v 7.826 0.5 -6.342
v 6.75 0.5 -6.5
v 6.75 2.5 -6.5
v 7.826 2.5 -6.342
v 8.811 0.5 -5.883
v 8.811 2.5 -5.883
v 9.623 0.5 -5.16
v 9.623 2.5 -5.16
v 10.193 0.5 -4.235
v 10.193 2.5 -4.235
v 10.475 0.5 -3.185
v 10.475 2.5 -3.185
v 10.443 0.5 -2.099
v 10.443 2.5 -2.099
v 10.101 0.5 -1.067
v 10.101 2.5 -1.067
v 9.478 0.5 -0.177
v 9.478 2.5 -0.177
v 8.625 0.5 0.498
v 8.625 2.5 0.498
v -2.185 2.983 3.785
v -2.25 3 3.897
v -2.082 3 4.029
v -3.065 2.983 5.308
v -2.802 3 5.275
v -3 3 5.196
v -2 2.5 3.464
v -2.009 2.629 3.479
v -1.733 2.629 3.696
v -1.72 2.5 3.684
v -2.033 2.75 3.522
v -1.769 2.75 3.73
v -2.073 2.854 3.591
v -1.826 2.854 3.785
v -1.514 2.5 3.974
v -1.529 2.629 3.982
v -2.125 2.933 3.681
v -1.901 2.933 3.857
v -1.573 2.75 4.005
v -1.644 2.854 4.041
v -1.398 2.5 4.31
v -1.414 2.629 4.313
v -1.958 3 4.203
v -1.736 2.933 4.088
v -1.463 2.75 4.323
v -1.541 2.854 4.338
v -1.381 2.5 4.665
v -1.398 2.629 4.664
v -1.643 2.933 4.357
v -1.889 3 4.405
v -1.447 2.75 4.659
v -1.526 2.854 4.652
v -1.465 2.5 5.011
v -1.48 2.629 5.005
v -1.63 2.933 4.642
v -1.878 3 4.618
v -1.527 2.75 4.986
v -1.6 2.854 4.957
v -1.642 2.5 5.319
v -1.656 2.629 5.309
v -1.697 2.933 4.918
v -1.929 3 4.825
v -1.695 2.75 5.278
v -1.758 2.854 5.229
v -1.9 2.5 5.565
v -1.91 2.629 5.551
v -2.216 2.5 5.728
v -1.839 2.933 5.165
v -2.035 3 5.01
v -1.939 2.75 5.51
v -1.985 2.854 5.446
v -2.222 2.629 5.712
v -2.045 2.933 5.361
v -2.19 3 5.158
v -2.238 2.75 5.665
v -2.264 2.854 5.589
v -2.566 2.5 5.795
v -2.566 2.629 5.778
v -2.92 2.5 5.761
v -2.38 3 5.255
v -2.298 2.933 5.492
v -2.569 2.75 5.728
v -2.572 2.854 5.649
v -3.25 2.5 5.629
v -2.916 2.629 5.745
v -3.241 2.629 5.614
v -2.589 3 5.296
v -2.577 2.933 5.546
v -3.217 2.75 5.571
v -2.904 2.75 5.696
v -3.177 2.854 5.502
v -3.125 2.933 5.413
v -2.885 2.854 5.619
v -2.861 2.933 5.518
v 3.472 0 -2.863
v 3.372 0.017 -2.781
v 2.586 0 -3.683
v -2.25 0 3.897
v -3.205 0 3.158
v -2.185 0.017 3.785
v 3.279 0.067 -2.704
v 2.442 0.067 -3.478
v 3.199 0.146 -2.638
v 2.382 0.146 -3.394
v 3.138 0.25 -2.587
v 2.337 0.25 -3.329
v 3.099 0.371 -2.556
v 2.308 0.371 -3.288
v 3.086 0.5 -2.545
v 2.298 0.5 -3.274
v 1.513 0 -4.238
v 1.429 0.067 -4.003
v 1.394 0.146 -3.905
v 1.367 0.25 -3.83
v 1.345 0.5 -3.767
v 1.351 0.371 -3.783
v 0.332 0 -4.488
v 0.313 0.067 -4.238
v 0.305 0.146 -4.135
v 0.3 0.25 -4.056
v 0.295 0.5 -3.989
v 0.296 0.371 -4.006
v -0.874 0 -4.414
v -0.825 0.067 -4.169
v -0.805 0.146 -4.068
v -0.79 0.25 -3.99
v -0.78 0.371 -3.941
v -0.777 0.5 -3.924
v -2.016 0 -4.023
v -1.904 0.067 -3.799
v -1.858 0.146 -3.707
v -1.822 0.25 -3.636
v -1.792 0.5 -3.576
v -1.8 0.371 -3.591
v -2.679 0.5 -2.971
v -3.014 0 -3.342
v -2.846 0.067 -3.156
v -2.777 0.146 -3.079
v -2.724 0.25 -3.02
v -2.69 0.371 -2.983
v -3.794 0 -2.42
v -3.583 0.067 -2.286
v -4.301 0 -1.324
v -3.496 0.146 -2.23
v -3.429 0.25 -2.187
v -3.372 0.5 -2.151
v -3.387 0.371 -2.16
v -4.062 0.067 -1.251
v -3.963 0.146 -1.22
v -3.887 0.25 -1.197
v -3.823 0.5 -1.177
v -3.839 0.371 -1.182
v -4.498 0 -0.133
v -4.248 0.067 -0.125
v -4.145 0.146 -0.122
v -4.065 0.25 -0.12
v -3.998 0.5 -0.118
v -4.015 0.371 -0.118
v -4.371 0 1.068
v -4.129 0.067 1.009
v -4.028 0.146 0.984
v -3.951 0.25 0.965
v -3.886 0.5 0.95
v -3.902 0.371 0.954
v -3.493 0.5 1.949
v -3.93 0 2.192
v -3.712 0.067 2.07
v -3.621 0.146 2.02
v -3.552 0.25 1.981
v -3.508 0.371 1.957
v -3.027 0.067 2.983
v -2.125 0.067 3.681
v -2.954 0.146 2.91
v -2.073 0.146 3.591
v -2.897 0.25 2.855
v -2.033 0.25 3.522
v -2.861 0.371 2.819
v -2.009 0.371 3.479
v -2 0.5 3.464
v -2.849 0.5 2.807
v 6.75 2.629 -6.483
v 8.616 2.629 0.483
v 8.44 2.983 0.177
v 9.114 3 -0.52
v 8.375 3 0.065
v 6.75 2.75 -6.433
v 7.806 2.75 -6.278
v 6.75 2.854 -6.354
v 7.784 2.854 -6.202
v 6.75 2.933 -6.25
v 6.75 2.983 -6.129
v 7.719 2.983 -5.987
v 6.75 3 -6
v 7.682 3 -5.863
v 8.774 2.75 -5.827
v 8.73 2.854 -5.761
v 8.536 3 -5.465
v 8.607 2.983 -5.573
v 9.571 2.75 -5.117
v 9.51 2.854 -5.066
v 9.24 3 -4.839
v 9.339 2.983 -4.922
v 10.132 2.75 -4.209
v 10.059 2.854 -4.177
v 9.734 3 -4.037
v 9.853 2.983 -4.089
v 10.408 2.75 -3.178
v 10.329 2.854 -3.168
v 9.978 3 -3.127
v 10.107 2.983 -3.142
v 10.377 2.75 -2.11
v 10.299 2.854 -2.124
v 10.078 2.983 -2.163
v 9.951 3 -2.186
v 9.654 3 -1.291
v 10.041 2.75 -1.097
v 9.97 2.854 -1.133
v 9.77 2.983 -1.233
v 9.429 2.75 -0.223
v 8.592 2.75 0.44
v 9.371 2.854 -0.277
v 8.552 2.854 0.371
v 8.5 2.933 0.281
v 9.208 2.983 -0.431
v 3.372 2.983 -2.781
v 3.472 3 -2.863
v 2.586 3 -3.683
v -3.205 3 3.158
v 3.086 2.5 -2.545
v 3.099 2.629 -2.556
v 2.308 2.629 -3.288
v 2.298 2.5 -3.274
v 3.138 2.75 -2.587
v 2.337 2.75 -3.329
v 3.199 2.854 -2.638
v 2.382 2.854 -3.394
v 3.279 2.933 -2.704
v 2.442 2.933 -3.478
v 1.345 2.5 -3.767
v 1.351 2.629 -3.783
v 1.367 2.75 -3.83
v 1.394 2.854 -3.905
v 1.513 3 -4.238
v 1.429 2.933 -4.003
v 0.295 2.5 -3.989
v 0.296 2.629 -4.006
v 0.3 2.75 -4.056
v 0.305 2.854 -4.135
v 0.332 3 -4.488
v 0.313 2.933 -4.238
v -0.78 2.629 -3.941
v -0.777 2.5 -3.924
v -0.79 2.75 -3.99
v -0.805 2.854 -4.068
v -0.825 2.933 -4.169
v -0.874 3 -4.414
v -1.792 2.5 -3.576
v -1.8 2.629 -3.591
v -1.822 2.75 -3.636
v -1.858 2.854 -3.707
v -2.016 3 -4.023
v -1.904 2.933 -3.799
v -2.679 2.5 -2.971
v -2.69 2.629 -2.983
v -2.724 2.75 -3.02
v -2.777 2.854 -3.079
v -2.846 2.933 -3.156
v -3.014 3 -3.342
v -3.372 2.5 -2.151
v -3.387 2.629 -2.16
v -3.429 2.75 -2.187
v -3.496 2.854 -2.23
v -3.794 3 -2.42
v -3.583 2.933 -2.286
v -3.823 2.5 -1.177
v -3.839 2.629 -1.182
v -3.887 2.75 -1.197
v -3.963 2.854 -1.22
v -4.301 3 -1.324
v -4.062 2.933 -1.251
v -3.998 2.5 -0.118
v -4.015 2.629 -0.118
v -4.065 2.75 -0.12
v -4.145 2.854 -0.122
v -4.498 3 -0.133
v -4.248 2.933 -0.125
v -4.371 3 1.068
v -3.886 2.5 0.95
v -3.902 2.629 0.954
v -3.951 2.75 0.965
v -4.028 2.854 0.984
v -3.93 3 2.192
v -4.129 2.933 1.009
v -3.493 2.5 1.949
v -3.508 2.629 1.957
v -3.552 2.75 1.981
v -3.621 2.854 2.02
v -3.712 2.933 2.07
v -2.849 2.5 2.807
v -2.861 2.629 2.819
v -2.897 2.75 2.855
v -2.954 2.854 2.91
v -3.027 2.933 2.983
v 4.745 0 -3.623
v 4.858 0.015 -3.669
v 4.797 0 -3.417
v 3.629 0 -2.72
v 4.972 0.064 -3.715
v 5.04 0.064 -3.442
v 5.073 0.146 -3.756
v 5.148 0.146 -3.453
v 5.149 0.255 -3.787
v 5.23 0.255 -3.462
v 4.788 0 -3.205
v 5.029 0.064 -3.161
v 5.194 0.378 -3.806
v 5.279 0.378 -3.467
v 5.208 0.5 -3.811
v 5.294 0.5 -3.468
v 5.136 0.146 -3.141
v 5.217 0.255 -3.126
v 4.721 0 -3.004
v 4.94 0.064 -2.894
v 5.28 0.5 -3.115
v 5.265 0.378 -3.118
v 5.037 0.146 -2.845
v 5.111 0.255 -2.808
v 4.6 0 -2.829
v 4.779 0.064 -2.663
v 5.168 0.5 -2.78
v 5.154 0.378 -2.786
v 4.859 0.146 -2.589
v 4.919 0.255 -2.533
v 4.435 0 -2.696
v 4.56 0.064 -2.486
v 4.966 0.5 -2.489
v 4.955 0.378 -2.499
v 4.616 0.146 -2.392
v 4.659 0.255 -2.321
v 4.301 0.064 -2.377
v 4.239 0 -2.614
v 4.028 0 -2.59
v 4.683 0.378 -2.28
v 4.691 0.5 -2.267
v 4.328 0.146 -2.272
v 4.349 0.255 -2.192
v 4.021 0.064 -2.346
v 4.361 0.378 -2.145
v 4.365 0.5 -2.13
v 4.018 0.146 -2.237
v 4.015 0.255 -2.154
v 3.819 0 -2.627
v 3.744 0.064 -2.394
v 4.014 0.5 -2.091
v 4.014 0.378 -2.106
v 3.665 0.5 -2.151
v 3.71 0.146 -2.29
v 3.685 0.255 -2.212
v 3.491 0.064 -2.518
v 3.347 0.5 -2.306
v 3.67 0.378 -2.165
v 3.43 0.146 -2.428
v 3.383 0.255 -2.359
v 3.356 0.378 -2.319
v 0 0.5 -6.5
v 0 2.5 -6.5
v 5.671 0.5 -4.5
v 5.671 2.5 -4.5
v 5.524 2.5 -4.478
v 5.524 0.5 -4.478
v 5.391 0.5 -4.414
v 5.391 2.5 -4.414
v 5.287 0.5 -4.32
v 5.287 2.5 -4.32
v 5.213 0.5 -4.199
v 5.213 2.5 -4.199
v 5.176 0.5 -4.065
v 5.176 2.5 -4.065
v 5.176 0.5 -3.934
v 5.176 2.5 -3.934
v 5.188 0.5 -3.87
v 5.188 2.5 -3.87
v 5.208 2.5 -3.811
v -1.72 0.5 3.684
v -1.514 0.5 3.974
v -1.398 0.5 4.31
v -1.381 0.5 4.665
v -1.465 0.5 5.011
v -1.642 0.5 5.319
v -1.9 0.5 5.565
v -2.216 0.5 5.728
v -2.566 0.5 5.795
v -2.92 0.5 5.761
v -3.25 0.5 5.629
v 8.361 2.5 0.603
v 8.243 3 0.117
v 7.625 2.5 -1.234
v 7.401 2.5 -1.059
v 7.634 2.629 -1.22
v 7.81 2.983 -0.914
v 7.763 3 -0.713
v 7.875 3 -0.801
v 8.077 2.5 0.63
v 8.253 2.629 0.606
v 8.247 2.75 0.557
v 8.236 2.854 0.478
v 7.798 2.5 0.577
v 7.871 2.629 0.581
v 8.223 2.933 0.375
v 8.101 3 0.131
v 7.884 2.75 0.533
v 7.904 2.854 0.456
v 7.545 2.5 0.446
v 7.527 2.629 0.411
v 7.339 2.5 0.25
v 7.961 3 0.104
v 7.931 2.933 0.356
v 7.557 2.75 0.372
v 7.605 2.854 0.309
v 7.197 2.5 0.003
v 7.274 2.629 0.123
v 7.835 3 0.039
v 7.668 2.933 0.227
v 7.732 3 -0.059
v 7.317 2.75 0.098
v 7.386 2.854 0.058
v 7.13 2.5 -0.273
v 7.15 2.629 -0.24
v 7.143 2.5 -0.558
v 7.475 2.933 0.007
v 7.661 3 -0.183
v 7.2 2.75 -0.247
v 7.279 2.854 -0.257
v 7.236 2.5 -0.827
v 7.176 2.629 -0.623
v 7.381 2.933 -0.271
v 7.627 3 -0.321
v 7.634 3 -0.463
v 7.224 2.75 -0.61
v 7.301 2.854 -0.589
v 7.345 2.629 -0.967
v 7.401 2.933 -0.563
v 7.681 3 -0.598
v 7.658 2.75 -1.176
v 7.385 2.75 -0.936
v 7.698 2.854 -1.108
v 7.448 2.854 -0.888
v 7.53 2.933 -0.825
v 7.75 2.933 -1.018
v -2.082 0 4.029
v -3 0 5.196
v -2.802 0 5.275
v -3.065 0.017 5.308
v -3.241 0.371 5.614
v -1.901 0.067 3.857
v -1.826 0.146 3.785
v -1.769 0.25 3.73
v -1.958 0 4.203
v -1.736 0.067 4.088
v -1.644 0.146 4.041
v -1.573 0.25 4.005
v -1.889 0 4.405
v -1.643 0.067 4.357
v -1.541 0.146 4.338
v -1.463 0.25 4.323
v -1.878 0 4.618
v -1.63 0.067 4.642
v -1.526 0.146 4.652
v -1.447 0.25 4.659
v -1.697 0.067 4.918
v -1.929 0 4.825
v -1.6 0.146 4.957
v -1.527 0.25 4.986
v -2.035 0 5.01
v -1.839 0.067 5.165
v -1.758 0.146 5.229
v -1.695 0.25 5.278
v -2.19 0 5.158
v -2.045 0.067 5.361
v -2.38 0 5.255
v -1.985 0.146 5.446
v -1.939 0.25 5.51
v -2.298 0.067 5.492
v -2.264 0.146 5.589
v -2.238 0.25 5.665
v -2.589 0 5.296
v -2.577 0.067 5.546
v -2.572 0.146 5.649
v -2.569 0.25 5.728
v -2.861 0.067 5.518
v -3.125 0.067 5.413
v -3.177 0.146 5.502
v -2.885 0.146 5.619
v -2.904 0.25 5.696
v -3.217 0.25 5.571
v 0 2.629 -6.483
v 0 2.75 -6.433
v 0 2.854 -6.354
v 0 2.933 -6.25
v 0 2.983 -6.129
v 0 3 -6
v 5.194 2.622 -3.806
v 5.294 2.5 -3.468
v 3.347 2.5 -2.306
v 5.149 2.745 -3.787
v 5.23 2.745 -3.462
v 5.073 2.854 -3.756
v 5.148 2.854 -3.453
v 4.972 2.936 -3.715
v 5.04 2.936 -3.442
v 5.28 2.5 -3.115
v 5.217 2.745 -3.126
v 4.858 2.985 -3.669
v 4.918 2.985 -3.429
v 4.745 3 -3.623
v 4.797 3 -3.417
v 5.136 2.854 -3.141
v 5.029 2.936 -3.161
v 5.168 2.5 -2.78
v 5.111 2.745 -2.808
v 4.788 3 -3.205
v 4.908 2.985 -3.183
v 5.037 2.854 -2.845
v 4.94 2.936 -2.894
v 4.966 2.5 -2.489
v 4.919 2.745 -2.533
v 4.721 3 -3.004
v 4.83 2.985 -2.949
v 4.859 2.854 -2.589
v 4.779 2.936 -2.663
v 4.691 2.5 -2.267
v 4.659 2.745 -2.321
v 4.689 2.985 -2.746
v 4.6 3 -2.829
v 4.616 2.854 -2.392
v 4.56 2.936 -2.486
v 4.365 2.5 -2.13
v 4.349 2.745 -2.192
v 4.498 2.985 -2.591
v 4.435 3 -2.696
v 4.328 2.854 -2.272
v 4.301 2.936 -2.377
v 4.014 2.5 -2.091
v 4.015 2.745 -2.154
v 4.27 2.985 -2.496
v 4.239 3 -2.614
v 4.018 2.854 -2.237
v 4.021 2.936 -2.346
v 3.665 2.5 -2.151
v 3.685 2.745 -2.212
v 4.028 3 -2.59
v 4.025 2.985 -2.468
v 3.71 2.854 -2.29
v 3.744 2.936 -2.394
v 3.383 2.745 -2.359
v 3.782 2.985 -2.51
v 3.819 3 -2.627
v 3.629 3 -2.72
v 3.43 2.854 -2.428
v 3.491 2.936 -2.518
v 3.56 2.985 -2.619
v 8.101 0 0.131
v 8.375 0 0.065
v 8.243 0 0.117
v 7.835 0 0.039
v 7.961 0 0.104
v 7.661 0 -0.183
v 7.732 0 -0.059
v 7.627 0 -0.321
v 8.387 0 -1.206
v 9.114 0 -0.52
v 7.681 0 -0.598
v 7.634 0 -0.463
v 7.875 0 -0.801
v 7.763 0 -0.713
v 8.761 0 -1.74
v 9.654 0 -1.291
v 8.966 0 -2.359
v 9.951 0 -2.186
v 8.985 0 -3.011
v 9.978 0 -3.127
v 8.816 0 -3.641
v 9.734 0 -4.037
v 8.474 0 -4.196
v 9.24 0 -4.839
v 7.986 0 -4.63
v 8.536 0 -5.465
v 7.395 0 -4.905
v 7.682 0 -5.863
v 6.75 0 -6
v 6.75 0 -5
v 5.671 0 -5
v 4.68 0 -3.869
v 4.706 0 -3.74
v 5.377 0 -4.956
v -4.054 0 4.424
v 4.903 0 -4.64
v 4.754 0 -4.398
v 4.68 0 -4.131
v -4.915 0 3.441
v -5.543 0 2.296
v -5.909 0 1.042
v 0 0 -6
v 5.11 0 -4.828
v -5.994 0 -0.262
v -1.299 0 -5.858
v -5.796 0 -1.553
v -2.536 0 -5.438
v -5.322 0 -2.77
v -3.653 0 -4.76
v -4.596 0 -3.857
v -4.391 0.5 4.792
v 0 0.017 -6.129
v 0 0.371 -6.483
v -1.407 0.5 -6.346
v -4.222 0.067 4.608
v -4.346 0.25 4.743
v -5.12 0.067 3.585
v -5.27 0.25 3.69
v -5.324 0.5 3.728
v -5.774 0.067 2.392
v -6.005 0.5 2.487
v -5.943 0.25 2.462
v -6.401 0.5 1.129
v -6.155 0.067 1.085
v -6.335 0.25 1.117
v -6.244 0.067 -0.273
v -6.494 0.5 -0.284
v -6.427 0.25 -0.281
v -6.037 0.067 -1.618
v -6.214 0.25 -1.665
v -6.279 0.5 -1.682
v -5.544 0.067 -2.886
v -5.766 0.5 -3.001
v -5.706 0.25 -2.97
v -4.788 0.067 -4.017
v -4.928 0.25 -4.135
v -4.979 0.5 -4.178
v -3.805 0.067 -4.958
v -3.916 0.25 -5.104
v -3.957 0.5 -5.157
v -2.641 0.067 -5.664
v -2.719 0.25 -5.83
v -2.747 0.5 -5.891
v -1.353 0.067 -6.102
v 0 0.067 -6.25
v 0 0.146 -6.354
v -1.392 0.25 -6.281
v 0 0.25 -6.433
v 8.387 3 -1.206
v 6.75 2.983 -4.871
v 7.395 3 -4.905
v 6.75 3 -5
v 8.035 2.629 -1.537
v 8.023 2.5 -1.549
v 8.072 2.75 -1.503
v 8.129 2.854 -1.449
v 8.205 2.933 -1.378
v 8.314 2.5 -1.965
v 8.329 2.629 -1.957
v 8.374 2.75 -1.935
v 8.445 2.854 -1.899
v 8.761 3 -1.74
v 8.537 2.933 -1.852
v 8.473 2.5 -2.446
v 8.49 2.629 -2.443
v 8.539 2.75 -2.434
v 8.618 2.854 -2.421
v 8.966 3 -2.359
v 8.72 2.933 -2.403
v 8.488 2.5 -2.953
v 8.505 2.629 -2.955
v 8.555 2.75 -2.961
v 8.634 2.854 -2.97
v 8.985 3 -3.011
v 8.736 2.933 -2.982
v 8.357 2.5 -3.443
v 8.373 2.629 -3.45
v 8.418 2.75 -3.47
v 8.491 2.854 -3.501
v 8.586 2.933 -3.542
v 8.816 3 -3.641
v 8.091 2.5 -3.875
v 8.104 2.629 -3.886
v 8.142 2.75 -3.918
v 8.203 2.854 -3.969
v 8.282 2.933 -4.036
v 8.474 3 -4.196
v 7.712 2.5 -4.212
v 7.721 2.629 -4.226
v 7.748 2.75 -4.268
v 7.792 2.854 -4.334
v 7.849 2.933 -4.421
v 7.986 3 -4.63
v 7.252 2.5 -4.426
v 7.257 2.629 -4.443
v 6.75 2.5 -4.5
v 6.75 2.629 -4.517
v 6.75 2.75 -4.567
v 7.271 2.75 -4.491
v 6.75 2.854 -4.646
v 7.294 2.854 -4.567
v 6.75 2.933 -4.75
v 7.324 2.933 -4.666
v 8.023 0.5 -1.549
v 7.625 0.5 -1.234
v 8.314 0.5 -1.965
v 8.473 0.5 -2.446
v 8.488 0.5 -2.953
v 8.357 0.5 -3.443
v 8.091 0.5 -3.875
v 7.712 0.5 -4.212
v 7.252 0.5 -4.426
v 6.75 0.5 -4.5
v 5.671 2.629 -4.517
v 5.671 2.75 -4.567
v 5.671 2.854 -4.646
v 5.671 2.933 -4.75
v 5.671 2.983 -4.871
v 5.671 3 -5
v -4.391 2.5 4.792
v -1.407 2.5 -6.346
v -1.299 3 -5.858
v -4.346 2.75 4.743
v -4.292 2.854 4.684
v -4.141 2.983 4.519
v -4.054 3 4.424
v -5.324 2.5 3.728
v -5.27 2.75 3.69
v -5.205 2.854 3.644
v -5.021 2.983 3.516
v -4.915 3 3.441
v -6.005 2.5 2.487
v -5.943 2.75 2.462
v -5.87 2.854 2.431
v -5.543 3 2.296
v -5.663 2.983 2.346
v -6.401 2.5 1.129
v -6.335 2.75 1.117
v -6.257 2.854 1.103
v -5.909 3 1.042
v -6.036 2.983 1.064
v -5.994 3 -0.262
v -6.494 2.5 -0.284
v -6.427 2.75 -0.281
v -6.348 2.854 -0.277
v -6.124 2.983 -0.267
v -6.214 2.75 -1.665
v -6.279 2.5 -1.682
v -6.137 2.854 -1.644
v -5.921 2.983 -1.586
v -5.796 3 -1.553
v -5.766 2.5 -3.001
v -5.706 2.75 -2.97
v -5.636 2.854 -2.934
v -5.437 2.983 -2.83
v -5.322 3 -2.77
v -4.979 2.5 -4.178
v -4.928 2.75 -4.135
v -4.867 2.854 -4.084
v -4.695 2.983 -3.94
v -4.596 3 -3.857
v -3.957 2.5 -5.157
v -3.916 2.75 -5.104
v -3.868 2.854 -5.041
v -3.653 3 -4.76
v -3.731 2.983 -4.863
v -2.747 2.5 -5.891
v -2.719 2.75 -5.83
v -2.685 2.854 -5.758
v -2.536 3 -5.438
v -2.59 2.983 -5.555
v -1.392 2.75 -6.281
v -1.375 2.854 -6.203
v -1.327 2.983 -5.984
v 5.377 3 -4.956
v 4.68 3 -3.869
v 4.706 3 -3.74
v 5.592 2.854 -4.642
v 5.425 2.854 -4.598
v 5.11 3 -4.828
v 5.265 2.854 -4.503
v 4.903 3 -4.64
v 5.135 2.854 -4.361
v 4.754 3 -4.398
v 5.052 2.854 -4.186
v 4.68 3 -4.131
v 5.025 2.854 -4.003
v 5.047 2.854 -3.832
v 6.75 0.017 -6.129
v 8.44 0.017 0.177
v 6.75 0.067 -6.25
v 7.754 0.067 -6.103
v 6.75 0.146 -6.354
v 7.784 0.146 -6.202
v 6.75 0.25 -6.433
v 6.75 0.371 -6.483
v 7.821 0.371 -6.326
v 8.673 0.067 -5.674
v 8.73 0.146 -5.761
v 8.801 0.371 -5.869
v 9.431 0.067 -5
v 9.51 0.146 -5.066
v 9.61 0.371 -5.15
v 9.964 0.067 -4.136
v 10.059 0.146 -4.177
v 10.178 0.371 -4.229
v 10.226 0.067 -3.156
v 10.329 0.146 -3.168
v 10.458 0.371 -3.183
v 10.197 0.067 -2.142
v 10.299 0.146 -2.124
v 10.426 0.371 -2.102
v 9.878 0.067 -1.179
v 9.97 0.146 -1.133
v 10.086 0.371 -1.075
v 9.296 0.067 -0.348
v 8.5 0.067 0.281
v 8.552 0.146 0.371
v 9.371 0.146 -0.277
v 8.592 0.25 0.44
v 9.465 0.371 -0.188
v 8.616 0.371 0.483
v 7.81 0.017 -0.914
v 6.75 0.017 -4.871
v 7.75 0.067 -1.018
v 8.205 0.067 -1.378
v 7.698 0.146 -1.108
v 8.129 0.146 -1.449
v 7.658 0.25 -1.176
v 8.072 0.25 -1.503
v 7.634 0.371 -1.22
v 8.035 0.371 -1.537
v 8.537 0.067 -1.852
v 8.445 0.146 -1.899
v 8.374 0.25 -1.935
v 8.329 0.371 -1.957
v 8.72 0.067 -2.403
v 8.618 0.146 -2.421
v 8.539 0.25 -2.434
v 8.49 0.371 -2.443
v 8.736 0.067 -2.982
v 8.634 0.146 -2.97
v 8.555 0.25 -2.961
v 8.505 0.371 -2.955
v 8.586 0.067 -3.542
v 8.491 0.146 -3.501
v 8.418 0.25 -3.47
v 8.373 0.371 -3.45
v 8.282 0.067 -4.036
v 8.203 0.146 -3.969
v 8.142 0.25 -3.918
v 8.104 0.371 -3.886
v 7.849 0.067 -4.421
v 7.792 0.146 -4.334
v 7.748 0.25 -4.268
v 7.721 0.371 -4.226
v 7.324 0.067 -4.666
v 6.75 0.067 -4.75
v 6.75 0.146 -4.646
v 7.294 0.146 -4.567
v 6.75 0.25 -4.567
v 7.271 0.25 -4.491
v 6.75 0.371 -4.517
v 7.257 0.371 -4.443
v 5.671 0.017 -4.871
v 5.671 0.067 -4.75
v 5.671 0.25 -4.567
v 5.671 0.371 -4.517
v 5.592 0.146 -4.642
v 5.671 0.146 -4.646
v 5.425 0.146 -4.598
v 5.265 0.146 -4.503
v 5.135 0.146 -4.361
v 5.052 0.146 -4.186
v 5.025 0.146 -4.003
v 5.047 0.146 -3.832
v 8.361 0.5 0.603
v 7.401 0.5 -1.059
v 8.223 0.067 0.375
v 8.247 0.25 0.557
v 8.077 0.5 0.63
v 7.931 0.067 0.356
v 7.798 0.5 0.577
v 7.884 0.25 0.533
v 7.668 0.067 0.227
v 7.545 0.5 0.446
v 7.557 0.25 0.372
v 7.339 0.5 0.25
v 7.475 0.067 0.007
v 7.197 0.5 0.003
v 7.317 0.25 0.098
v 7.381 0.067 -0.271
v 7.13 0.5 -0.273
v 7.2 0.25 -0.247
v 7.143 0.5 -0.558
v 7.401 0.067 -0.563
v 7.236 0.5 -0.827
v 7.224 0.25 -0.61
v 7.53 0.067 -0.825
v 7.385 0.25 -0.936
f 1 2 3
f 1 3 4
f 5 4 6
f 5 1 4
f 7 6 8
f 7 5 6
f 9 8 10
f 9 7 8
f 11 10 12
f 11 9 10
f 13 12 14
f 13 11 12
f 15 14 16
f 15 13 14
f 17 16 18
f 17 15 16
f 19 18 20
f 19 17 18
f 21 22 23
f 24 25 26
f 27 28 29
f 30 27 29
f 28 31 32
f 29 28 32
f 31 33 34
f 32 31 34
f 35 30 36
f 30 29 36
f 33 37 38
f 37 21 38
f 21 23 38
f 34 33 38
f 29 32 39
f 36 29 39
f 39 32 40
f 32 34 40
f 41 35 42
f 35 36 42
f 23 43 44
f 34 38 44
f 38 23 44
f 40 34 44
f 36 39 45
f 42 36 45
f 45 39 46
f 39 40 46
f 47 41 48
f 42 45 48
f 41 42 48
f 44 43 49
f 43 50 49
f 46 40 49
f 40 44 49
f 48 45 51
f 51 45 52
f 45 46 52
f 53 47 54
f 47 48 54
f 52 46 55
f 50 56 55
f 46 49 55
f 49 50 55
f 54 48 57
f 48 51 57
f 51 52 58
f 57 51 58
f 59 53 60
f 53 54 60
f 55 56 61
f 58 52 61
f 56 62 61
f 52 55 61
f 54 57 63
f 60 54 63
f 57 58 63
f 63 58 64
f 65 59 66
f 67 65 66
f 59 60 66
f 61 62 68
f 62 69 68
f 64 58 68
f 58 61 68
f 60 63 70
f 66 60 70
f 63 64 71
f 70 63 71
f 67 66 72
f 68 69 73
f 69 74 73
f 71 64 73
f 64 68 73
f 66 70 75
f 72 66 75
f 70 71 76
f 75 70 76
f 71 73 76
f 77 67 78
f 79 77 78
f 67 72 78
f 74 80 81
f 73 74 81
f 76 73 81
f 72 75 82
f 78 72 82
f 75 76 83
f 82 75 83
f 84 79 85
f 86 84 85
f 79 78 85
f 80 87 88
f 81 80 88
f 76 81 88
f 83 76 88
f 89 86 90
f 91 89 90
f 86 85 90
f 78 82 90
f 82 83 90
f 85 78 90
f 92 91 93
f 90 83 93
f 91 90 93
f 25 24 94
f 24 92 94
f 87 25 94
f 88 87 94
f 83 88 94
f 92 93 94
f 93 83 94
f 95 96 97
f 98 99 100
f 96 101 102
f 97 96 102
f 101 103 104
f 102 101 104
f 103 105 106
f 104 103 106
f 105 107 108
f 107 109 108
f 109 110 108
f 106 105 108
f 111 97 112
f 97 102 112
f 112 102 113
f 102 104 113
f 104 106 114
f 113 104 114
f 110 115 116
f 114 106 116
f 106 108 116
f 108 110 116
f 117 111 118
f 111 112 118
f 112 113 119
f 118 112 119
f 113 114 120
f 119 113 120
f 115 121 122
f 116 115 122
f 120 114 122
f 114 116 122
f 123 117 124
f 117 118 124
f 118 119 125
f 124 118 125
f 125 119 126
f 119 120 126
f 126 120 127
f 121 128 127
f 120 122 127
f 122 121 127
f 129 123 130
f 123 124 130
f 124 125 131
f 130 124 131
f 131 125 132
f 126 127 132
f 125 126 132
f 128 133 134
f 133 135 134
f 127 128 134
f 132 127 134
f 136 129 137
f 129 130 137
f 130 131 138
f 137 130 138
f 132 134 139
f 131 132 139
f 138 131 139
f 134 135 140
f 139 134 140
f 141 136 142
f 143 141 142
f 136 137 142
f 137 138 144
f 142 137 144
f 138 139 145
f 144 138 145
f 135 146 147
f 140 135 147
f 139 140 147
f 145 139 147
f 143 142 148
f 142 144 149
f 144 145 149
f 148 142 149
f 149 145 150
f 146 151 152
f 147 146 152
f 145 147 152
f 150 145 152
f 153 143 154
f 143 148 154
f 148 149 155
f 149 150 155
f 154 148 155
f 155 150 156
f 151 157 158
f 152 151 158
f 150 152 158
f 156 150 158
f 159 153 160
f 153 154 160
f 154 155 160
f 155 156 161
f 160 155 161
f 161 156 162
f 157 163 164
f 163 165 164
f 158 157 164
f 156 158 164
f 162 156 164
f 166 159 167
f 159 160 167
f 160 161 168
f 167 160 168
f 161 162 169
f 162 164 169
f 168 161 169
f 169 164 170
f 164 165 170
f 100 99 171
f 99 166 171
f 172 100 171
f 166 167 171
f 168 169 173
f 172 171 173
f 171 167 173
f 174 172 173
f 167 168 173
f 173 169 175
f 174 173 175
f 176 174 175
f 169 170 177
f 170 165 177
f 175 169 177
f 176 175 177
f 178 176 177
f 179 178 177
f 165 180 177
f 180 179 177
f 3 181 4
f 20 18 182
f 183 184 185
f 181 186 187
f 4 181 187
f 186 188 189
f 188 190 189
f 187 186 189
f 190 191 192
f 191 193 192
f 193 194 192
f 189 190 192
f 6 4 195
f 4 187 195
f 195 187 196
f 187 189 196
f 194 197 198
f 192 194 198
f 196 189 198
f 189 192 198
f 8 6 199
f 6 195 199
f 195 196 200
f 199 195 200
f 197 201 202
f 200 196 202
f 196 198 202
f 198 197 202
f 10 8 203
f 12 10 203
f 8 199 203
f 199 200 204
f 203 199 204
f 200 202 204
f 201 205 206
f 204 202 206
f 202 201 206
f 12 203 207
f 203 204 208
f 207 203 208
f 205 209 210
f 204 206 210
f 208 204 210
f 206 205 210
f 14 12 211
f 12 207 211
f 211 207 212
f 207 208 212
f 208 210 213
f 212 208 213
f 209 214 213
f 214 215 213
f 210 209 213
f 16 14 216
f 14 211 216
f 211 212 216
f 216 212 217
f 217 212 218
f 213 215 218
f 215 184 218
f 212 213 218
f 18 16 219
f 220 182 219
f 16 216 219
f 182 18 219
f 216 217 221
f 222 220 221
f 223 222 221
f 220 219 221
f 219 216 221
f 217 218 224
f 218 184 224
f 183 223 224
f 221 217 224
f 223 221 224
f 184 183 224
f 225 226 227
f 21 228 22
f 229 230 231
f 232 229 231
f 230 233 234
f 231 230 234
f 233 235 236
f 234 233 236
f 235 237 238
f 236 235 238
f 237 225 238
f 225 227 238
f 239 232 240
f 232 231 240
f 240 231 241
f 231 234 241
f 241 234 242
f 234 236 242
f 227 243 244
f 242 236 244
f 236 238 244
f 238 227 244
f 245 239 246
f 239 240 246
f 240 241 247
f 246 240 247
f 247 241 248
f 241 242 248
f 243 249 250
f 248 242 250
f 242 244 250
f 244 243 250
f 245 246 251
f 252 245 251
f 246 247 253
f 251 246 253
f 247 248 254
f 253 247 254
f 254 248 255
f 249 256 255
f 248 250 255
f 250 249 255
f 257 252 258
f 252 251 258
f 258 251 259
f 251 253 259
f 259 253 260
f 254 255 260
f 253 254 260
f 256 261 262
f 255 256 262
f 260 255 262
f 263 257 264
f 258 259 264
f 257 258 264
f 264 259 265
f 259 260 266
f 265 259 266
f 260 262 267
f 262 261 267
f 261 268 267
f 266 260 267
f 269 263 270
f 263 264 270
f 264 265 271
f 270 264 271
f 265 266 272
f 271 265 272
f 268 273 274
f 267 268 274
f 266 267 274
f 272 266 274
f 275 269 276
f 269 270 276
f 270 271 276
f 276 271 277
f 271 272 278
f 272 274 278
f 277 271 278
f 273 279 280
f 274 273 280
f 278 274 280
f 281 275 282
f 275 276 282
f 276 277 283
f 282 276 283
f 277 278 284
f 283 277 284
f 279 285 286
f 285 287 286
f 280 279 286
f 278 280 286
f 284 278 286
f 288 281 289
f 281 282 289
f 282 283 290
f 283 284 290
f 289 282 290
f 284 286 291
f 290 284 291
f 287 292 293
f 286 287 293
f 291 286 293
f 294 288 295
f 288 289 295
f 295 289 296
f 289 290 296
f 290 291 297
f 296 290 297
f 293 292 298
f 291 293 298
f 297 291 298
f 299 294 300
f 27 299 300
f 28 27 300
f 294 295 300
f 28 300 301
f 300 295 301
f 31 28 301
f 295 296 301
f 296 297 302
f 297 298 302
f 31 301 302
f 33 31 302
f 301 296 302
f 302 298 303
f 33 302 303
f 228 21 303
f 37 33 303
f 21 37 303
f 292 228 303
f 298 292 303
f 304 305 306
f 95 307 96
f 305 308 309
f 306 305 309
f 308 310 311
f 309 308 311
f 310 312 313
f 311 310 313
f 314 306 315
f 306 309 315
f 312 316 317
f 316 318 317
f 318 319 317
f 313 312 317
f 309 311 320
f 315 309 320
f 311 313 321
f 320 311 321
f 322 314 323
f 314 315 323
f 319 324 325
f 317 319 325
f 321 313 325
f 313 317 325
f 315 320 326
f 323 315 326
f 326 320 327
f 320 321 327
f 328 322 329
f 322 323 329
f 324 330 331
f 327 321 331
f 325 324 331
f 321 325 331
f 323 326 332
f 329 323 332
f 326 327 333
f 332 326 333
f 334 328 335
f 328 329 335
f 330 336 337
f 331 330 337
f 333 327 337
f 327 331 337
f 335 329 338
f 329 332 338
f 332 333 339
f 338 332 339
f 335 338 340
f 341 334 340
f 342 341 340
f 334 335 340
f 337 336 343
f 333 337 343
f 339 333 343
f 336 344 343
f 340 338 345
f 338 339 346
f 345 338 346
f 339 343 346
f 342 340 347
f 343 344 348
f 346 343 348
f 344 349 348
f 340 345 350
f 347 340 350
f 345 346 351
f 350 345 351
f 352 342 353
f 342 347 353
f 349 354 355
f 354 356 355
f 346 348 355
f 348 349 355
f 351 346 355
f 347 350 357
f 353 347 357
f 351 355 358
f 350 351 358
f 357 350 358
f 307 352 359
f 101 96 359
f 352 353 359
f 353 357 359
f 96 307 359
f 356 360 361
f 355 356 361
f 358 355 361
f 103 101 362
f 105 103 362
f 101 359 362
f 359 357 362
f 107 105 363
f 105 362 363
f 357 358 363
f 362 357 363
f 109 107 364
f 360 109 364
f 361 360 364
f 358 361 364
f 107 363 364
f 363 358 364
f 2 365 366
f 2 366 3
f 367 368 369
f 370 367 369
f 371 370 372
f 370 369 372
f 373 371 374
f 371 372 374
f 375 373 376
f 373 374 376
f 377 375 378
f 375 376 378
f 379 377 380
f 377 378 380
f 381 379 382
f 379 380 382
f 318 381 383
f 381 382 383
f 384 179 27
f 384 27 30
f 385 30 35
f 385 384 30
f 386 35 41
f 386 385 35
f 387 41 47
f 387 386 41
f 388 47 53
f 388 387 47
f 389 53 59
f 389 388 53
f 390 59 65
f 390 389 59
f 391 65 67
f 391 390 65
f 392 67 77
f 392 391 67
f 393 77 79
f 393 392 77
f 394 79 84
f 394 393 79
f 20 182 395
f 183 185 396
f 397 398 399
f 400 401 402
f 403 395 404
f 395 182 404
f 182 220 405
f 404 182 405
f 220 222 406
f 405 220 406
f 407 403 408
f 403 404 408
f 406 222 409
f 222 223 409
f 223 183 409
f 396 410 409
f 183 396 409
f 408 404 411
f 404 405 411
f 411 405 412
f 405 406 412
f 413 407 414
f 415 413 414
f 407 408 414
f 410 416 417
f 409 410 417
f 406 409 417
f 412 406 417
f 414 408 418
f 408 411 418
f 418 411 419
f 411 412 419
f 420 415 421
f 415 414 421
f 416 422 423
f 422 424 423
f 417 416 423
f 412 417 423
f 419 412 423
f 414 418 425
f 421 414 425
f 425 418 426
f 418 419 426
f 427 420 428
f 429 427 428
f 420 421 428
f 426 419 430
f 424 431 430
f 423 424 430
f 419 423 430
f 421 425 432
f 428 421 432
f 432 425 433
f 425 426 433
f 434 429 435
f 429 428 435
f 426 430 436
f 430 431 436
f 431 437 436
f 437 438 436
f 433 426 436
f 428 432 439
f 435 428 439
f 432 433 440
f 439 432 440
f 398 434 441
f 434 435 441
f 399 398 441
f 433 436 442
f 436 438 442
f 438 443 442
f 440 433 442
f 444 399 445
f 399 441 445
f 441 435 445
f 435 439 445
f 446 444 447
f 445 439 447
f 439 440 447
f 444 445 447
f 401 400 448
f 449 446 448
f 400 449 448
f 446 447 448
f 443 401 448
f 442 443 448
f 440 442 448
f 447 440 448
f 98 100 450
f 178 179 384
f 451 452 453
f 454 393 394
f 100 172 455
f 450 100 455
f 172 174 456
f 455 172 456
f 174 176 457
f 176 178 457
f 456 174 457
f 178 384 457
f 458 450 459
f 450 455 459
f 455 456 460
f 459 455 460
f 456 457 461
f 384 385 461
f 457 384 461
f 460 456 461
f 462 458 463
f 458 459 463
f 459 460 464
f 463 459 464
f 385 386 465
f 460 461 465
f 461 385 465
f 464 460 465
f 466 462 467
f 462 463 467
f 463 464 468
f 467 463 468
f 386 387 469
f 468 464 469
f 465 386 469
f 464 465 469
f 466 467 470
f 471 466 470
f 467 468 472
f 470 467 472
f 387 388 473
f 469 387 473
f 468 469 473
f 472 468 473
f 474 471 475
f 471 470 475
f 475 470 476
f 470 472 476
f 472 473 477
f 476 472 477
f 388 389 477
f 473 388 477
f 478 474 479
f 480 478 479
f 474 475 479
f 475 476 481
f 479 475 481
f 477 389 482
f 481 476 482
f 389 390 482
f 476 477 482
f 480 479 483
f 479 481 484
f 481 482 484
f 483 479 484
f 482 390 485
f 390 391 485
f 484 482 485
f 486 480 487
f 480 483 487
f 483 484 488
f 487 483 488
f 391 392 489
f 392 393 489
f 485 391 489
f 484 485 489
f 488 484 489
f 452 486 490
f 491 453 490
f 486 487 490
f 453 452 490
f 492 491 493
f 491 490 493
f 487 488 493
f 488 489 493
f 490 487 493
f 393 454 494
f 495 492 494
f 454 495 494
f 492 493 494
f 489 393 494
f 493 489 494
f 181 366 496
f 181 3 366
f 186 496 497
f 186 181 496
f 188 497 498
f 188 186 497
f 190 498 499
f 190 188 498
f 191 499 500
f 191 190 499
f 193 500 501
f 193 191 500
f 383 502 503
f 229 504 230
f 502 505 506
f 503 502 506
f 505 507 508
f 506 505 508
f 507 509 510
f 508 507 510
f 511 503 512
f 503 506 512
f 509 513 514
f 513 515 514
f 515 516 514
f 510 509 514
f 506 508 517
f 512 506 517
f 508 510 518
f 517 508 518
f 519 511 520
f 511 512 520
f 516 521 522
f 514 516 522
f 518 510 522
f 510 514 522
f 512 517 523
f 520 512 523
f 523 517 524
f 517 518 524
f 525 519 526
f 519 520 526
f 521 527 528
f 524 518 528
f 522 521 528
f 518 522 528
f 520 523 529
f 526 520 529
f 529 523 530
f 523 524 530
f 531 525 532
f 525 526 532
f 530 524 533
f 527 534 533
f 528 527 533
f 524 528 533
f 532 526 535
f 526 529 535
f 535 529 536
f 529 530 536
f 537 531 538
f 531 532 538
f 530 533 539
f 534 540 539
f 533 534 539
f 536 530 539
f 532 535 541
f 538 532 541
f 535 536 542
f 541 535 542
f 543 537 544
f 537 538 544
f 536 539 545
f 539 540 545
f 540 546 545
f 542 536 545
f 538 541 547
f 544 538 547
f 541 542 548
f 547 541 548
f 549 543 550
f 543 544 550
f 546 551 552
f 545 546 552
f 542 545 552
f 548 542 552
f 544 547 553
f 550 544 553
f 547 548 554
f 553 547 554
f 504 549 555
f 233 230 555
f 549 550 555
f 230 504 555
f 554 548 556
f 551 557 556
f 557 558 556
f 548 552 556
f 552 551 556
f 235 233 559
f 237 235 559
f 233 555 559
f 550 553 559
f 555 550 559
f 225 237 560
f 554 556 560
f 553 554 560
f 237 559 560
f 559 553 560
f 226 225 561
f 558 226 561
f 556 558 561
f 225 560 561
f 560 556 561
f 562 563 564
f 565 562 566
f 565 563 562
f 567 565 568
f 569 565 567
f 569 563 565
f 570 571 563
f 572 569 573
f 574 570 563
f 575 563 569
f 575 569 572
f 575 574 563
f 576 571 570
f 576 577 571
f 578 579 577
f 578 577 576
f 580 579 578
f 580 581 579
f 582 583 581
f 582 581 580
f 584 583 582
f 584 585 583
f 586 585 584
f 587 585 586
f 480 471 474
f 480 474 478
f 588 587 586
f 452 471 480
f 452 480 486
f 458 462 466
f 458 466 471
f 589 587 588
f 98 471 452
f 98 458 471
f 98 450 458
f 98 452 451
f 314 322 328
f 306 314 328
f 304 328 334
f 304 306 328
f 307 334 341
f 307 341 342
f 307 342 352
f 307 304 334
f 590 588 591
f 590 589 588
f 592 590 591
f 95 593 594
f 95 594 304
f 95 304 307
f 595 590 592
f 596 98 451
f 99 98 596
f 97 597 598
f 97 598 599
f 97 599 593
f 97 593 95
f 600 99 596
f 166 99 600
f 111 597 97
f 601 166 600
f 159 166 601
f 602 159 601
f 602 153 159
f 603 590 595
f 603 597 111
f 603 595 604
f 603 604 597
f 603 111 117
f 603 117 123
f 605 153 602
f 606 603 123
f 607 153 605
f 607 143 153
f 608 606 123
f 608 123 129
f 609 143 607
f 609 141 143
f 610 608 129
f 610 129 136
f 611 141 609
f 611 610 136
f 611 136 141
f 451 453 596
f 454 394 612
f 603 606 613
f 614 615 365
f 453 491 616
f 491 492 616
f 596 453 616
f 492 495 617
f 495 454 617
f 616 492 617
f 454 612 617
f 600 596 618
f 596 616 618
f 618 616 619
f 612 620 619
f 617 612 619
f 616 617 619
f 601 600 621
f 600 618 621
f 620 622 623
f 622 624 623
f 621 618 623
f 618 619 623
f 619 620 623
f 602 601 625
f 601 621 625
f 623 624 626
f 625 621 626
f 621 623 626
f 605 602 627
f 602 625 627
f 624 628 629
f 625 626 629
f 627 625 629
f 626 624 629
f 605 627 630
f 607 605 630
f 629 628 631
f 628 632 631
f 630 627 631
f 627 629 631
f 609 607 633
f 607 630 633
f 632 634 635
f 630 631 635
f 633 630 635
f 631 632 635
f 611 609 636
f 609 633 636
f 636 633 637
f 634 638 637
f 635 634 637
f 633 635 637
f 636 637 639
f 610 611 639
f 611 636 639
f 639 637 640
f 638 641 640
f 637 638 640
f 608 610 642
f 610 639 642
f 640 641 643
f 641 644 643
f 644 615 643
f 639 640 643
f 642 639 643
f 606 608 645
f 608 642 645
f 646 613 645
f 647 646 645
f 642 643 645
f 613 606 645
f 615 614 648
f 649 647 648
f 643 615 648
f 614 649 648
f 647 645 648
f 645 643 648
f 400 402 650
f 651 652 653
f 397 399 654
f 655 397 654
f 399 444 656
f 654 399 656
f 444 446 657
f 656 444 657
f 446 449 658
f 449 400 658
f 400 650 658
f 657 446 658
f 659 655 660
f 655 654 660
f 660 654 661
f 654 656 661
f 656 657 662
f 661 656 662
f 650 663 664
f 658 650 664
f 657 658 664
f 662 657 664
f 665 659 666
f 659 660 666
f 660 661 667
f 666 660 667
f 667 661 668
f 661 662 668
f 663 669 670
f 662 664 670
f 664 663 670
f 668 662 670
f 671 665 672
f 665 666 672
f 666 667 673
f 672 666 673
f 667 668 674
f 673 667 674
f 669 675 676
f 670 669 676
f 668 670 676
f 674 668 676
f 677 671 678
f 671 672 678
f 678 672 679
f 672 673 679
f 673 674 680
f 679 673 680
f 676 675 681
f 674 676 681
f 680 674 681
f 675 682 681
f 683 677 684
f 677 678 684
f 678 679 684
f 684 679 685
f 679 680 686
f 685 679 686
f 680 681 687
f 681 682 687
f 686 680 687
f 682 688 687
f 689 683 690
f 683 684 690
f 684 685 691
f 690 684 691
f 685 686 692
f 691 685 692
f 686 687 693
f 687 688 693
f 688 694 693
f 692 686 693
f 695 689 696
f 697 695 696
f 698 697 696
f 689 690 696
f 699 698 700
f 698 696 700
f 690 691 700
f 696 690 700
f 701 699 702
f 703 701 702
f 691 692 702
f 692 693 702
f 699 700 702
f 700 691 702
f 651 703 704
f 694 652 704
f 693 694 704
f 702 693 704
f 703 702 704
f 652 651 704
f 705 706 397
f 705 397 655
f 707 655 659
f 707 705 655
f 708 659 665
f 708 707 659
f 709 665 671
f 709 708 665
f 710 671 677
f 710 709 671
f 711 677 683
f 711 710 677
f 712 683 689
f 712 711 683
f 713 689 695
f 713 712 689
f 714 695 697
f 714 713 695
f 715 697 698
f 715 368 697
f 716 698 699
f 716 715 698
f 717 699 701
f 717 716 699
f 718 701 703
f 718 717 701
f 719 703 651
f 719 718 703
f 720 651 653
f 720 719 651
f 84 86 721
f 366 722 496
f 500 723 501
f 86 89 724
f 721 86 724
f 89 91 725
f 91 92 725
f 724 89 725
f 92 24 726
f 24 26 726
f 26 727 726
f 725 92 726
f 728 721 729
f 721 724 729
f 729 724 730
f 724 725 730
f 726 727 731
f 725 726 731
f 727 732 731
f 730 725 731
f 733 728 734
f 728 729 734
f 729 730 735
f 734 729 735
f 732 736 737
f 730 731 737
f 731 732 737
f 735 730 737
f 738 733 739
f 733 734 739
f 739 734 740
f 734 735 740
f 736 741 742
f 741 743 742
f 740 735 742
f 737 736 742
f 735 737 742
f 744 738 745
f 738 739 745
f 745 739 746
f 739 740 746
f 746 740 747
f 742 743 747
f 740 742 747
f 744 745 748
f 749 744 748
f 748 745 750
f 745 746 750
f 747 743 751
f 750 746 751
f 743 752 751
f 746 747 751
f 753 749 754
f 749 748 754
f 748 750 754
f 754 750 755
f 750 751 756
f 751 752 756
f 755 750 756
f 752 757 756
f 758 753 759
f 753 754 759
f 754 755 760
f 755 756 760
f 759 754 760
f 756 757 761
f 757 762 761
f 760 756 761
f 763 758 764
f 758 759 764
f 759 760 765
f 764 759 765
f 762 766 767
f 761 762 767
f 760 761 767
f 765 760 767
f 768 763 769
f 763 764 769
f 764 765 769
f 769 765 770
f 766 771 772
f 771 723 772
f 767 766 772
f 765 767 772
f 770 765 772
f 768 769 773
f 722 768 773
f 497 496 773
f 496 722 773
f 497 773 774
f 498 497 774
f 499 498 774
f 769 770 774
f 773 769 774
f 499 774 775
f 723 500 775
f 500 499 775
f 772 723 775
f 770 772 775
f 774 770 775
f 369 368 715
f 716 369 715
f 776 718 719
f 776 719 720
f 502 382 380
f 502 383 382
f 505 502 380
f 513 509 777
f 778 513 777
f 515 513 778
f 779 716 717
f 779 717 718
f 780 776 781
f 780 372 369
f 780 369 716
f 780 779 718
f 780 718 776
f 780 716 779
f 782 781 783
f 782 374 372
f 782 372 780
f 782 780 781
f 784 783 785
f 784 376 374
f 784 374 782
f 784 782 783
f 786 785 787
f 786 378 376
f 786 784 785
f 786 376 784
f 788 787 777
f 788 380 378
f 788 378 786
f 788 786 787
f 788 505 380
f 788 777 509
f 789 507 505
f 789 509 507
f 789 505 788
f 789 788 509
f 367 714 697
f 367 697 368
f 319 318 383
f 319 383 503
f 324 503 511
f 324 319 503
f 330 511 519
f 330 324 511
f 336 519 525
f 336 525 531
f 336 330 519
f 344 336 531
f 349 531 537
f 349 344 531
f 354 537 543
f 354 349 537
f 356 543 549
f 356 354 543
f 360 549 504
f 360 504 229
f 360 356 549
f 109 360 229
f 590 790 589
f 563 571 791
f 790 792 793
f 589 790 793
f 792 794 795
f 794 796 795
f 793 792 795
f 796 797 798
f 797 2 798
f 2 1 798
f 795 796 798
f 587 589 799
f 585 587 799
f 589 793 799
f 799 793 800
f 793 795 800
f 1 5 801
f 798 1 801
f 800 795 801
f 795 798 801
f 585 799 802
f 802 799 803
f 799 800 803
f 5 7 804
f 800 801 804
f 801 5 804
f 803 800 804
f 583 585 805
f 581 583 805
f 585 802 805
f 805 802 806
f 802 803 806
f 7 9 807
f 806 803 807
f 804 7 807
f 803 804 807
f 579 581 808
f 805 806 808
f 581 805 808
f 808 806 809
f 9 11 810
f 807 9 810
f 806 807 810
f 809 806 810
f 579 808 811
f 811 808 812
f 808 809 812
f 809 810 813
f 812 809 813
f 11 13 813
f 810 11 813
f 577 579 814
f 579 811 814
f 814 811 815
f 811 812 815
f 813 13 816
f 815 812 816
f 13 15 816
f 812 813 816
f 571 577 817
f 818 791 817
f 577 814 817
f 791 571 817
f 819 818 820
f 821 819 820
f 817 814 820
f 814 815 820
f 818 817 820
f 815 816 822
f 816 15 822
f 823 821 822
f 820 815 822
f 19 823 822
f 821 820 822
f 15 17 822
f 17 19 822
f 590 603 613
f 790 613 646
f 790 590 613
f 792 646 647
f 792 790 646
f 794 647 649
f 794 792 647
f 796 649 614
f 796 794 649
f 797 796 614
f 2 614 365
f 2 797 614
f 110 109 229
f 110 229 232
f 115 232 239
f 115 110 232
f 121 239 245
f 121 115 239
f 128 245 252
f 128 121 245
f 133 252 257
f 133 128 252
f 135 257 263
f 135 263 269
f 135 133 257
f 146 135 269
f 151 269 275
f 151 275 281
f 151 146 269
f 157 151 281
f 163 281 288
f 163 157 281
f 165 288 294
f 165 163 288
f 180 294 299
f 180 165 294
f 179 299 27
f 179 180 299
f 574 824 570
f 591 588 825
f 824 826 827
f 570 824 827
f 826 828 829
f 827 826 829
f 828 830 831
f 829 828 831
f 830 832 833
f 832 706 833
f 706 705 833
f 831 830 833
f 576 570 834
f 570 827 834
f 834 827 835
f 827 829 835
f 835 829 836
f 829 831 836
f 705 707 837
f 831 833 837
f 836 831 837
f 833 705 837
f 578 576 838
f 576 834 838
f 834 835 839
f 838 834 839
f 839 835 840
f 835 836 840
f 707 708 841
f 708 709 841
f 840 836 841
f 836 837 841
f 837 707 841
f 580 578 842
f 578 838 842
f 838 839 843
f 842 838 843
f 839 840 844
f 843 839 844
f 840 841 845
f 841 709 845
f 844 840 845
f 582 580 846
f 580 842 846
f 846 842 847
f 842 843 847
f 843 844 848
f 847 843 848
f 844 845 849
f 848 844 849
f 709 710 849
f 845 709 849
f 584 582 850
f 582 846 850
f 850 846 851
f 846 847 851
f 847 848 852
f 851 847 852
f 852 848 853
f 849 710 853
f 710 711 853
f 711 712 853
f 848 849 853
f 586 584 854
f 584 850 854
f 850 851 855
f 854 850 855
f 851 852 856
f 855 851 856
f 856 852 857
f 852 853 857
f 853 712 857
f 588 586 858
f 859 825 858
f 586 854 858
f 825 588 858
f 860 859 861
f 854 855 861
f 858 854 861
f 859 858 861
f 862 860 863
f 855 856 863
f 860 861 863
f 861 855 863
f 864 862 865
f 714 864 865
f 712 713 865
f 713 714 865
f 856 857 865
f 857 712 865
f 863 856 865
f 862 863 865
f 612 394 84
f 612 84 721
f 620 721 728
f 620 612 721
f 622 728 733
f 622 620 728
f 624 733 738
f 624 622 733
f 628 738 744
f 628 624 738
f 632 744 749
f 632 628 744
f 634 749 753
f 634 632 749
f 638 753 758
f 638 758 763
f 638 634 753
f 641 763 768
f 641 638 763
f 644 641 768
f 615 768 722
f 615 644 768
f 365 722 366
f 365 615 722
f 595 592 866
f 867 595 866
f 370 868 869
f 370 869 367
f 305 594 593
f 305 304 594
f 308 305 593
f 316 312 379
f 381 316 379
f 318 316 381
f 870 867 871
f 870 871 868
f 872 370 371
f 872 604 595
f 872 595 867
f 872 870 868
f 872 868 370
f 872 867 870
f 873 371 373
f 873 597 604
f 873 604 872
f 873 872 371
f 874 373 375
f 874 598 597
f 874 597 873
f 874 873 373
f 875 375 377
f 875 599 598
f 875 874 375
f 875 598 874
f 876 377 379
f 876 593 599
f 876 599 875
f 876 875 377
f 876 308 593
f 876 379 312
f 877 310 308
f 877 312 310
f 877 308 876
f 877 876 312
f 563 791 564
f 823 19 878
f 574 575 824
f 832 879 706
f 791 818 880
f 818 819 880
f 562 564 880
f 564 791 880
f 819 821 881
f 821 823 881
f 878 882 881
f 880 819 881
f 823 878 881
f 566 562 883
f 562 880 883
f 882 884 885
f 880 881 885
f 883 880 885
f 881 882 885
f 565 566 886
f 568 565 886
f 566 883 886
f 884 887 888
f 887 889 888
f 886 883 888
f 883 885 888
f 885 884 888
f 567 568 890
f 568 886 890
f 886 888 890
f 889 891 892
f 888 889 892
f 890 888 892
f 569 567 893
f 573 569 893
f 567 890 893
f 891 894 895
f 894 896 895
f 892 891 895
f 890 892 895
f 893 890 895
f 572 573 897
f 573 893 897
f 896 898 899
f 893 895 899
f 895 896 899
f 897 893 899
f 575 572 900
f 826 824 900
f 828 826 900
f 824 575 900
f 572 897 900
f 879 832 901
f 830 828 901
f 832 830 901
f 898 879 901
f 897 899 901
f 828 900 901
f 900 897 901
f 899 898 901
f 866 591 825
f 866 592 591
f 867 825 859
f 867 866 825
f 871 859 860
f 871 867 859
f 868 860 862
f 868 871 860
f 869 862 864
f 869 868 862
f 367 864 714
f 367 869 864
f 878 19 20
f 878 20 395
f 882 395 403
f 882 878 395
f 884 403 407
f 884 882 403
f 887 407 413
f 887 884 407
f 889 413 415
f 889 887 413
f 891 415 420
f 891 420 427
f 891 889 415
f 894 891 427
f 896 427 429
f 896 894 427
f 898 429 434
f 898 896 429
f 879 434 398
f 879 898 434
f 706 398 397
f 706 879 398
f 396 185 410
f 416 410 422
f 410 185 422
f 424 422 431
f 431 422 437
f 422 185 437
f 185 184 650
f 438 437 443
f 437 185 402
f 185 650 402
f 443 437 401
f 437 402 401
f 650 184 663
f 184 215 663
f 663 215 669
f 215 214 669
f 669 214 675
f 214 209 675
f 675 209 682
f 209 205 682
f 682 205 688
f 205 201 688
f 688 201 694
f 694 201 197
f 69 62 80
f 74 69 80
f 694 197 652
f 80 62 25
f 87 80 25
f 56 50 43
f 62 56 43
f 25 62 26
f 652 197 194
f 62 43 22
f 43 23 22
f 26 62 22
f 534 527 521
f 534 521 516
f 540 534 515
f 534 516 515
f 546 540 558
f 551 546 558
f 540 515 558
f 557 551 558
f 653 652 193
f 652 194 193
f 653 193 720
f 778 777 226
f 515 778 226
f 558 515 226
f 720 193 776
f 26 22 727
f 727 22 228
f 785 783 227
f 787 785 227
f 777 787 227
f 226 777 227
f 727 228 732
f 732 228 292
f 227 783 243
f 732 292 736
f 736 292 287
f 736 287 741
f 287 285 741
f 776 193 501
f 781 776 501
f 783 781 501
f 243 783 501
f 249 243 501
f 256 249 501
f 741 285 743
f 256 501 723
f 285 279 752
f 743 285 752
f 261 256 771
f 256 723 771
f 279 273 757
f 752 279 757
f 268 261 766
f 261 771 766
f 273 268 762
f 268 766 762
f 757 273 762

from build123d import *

# Parameters (mm, degrees)
BOSS_EXTRUDE1_DEPTH = 3
FILLET1_R           = 0.5
FILLET2_R           = 0.5


with BuildPart() as part:
    # Sketch1 → Boss-Extrude1 (new body)
    with BuildSketch(Plane(origin=(0, 0, 0), x_dir=(1, 0, 0), z_dir=(0, 1, 0))):
        with BuildLine():
            Line((6.75, 4.5), (4.69041576, 4.5))
            ThreePointArc((4.69041576, 4.5), (4.856129901, 4.320648376), (5.014990498, 4.135198944))
            ThreePointArc((5.014990498, 4.135198944), (4.845799815, 2.375547128), (3.086147999, 2.544737811))
            ThreePointArc((3.086147999, 2.544737811), (-3.053107791, 2.584285746), (-2, -3.464101615))
            ThreePointArc((-2, -3.464101615), (-1.542468245, -5.17163337), (-3.25, -5.629165125))
            ThreePointArc((-3.25, -5.629165125), (-6.278517871, 1.682323793), (0, 6.5))
            Line((0, 6.5), (6.75, 6.5))
            ThreePointArc((6.75, 6.5), (10.372221849, 3.720571419), (8.625, -0.497595264))
            ThreePointArc((8.625, -0.497595264), (7.258974596, -0.13156986), (7.625, 1.234455543))
            ThreePointArc((7.625, 1.234455543), (8.440370196, 3.202933329), (6.75, 4.5))
        make_face()
    extrude(amount=BOSS_EXTRUDE1_DEPTH)

    # Fillet1
    fillet1_edges = [part.edges().sort_by_distance(p)[0] for p in [
        (4.69041576, 1.5, -4.5),
    ]]
    fillet(fillet1_edges, radius=FILLET1_R)

    # Fillet2
    fillet2_edges = [part.edges().sort_by_distance(p)[0] for p in [
        (-6.278517871, 0, -1.682323793),
        (3.375, 0, -6.5),
        (10.372221849, 0, -3.720571419),
        (7.258974596, 0, 0.13156986),
        (8.440370196, 0, -3.202933329),
        (4.691239473, 0, -2.266636339),
        (8.440370196, 3, -3.202933329),
        (7.258974596, 3, 0.13156986),
        (10.372221849, 3, -3.720571419),
        (3.375, 3, -6.5),
        (-6.278517871, 3, -1.682323793),
        (-1.542468245, 3, 5.17163337),
        (6.210663896, 0, -4.5),
        (6.210663896, 3, -4.5),
        (5.256424049, 0, -4.279024881),
        (5.256424049, 3, -4.279024881),
        (-3.053107791, 3, -2.584285746),
        (4.691239473, 3, -2.266636339),
        (-3.053107791, 0, -2.584285746),
        (-1.542468245, 0, 5.17163337),
    ]]
    fillet(fillet2_edges, radius=FILLET2_R)


solid = part.part
